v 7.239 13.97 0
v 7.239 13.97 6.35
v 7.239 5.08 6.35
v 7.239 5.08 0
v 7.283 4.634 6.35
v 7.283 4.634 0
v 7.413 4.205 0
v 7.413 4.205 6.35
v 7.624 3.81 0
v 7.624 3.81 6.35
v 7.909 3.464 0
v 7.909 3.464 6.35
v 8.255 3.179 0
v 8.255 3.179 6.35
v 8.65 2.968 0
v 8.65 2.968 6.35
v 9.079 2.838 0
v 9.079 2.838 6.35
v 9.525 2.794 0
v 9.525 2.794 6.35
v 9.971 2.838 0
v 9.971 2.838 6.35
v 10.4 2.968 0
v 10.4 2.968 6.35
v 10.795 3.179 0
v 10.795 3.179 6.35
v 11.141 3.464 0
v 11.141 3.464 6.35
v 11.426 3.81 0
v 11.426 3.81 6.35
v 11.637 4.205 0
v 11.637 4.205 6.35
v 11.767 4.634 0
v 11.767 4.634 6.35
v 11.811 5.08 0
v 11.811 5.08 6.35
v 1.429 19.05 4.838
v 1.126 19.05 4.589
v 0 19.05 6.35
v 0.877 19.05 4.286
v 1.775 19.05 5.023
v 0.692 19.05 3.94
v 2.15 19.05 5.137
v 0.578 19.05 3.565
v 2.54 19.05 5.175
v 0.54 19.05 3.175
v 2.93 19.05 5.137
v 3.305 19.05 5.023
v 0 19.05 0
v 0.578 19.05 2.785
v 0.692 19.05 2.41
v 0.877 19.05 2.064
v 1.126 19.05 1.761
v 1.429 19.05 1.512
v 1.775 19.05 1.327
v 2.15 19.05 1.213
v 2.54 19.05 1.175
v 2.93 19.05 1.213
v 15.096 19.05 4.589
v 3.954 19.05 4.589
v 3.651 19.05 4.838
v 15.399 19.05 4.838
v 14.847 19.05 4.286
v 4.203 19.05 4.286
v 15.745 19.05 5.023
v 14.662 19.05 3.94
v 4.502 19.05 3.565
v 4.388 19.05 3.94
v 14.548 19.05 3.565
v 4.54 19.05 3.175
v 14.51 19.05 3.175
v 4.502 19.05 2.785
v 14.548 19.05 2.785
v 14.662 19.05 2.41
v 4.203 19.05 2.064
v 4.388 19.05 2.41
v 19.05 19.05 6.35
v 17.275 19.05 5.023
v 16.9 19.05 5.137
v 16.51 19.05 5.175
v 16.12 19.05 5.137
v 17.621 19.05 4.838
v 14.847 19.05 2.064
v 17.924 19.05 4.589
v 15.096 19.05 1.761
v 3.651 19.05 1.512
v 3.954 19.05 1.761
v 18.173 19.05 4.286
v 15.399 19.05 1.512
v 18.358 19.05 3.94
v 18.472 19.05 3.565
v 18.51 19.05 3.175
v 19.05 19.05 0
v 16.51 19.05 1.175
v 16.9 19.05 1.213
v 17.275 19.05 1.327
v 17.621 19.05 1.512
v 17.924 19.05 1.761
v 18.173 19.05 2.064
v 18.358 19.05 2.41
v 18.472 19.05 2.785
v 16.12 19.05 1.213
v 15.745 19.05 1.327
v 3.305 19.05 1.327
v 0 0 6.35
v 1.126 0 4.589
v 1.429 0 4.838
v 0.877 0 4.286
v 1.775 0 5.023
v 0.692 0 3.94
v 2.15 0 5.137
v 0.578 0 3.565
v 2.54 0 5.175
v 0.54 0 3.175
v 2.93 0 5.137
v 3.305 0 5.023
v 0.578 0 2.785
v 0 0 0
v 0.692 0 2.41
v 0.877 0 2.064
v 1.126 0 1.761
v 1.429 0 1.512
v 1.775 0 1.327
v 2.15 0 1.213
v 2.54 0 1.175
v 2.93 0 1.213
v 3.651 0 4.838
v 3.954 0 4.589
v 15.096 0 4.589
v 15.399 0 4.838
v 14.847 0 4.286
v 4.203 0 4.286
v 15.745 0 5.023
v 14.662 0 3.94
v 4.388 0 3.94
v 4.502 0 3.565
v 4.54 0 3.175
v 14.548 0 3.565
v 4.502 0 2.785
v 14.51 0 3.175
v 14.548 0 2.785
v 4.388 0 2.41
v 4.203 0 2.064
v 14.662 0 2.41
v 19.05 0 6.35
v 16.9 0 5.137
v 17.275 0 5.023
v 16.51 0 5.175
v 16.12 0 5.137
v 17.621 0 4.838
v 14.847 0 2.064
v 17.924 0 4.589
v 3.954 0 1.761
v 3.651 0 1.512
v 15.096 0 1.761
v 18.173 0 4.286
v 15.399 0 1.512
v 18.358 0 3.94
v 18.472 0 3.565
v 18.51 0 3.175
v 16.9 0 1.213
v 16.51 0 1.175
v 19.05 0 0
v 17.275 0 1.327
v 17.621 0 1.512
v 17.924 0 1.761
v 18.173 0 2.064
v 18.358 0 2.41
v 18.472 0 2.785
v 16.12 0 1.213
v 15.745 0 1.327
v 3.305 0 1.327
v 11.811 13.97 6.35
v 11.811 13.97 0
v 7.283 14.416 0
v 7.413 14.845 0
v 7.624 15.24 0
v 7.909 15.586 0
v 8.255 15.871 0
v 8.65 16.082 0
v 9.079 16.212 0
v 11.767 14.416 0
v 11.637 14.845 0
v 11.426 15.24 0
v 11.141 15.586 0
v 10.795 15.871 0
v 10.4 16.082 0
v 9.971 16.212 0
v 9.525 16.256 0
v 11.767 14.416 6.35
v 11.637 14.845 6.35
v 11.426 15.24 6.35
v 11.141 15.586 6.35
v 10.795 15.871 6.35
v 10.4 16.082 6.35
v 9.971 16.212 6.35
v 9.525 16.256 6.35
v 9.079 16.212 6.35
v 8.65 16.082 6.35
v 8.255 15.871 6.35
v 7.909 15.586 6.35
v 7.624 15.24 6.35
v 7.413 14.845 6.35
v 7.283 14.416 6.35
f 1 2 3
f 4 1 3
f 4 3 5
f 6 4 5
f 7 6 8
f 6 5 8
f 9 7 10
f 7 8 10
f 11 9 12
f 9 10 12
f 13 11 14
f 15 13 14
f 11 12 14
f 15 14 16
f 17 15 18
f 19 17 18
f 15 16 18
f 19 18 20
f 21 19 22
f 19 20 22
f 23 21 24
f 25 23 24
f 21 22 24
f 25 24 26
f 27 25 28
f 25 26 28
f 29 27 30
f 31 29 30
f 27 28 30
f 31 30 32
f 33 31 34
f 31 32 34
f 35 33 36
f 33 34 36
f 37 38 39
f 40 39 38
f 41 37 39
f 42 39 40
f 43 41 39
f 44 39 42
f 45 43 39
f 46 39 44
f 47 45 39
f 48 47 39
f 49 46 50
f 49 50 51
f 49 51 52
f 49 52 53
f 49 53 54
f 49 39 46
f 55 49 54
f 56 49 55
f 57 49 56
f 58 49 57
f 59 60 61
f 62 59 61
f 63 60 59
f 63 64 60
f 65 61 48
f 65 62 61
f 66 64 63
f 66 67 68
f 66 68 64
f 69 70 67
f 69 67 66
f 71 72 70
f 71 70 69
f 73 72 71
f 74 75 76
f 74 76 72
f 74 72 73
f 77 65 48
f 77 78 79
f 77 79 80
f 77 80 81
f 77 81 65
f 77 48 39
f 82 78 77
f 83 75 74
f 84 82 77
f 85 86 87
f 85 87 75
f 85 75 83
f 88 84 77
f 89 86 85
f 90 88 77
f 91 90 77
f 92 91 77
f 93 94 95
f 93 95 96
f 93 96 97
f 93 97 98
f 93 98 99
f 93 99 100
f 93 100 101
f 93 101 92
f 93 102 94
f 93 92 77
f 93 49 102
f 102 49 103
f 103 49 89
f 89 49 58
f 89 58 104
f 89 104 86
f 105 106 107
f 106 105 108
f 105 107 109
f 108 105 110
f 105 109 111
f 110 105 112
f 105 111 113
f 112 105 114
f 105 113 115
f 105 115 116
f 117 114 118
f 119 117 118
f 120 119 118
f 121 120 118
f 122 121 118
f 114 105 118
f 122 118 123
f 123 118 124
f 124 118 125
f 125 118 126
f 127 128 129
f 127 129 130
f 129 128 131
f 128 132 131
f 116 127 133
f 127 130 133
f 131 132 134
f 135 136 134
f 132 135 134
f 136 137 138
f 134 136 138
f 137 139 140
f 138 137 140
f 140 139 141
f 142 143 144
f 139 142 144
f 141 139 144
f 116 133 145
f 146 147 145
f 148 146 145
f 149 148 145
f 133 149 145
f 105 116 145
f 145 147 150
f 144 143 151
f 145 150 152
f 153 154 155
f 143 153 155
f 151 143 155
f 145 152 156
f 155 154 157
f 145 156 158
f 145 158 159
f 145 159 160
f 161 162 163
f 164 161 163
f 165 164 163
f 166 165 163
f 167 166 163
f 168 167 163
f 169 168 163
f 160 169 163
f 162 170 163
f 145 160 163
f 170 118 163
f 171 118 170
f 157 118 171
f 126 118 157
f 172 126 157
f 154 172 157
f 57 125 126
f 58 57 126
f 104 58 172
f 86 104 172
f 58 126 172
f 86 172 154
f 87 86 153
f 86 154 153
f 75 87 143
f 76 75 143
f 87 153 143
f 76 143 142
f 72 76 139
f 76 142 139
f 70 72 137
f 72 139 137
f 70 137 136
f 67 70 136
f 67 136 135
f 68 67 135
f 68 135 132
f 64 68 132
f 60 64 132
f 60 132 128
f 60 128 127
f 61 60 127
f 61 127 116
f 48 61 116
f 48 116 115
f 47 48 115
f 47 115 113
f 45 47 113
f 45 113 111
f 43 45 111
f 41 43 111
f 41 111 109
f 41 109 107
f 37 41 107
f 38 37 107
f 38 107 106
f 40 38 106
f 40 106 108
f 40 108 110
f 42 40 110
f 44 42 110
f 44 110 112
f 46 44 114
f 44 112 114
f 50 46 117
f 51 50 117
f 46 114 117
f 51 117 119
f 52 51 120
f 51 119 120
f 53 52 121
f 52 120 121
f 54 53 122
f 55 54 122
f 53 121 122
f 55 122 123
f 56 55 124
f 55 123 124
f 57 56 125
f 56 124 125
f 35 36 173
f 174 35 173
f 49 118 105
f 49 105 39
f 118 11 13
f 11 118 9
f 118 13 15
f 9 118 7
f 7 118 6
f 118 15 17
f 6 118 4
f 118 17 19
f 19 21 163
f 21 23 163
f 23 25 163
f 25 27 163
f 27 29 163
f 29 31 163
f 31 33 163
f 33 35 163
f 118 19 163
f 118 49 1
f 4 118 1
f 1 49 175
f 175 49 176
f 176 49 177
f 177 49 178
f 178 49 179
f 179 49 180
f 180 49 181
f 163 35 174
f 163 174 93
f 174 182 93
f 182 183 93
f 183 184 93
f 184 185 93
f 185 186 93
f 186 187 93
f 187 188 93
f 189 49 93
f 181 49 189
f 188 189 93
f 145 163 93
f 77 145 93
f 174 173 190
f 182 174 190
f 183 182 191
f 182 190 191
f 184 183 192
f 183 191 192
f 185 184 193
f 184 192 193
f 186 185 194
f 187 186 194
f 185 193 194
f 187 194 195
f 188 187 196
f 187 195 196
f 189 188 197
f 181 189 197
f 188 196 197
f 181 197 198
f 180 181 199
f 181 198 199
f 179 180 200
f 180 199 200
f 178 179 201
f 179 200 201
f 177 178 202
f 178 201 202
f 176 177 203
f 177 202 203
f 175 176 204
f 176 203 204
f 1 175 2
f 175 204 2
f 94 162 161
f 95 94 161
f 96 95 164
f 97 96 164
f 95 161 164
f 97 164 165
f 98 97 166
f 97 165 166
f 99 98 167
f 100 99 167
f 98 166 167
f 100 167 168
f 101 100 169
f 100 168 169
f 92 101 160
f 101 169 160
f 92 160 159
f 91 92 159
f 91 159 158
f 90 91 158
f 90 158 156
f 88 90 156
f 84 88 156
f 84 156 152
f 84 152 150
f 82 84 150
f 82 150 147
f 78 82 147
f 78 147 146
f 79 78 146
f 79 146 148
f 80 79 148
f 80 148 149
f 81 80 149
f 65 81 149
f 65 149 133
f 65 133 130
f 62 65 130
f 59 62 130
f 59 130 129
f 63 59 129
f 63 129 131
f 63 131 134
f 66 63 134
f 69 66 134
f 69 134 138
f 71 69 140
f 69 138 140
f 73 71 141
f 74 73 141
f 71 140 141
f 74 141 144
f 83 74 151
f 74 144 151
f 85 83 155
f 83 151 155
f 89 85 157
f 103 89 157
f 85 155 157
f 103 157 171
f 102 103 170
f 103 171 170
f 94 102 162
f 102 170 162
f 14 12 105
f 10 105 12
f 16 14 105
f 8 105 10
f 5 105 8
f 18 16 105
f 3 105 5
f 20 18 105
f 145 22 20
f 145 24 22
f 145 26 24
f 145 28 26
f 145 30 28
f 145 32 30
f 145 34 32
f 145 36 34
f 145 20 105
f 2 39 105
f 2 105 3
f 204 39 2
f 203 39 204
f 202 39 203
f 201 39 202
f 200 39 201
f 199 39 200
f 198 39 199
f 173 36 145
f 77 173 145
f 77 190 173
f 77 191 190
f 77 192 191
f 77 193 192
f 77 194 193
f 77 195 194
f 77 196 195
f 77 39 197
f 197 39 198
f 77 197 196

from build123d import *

# Parameters (mm, degrees)
SKETCH1_W           = 19.05
SKETCH1_H           = 19.05
BOSS_EXTRUDE1_DEPTH = 6.35
SKETCH2_R           = 2
CUT_EXTRUDE1_DEPTH  = 28.679008291
CUT_EXTRUDE2_DEPTH  = 28.679008291


with BuildPart() as part:
    # Sketch1 → Boss-Extrude1 (new body)
    with BuildSketch(Plane.XY):
        with Locations((9.525, 9.525)):
            Rectangle(SKETCH1_W, SKETCH1_H)
    extrude(amount=BOSS_EXTRUDE1_DEPTH)

    # Sketch2 → Cut-Extrude1 (cut, through all)
    with BuildSketch(Plane.XZ):
        with Locations(Location((2.54, 3.175, 0), (0, 0, 270))):
            Circle(SKETCH2_R)
        with Locations(Location((16.51, 3.175, 0), (0, 0, 270))):
            Circle(SKETCH2_R)
    extrude(amount=-CUT_EXTRUDE1_DEPTH, mode=Mode.SUBTRACT)

    # Sketch3 → Cut-Extrude2 (cut, through all)
    with BuildSketch(Plane.XY.offset(6.35)):
        with BuildLine():
            ThreePointArc((11.811, 13.97), (9.525, 16.256), (7.239, 13.97))
            Line((7.239, 13.97), (11.811, 13.97))
        make_face()
        with BuildLine():
            Line((11.811, 13.97), (7.239, 13.97))
            ThreePointArc((7.239, 13.97), (9.525, 11.684), (11.811, 13.97))
        make_face()
        with BuildLine():
            ThreePointArc((11.811, 13.97), (9.525, 11.684), (7.239, 13.97))
            Line((7.239, 13.97), (7.239, 5.08))
            ThreePointArc((7.239, 5.08), (9.525, 7.366), (11.811, 5.08))
            Line((11.811, 5.08), (11.811, 13.97))
        make_face()
        with BuildLine():
            ThreePointArc((11.811, 5.08), (9.525, 7.366), (7.239, 5.08))
            Line((7.239, 5.08), (11.811, 5.08))
        make_face()
        with BuildLine():
            Line((11.811, 5.08), (7.239, 5.08))
            ThreePointArc((7.239, 5.08), (9.525, 2.794), (11.811, 5.08))
        make_face()
    extrude(amount=-CUT_EXTRUDE2_DEPTH, mode=Mode.SUBTRACT)


solid = part.part
